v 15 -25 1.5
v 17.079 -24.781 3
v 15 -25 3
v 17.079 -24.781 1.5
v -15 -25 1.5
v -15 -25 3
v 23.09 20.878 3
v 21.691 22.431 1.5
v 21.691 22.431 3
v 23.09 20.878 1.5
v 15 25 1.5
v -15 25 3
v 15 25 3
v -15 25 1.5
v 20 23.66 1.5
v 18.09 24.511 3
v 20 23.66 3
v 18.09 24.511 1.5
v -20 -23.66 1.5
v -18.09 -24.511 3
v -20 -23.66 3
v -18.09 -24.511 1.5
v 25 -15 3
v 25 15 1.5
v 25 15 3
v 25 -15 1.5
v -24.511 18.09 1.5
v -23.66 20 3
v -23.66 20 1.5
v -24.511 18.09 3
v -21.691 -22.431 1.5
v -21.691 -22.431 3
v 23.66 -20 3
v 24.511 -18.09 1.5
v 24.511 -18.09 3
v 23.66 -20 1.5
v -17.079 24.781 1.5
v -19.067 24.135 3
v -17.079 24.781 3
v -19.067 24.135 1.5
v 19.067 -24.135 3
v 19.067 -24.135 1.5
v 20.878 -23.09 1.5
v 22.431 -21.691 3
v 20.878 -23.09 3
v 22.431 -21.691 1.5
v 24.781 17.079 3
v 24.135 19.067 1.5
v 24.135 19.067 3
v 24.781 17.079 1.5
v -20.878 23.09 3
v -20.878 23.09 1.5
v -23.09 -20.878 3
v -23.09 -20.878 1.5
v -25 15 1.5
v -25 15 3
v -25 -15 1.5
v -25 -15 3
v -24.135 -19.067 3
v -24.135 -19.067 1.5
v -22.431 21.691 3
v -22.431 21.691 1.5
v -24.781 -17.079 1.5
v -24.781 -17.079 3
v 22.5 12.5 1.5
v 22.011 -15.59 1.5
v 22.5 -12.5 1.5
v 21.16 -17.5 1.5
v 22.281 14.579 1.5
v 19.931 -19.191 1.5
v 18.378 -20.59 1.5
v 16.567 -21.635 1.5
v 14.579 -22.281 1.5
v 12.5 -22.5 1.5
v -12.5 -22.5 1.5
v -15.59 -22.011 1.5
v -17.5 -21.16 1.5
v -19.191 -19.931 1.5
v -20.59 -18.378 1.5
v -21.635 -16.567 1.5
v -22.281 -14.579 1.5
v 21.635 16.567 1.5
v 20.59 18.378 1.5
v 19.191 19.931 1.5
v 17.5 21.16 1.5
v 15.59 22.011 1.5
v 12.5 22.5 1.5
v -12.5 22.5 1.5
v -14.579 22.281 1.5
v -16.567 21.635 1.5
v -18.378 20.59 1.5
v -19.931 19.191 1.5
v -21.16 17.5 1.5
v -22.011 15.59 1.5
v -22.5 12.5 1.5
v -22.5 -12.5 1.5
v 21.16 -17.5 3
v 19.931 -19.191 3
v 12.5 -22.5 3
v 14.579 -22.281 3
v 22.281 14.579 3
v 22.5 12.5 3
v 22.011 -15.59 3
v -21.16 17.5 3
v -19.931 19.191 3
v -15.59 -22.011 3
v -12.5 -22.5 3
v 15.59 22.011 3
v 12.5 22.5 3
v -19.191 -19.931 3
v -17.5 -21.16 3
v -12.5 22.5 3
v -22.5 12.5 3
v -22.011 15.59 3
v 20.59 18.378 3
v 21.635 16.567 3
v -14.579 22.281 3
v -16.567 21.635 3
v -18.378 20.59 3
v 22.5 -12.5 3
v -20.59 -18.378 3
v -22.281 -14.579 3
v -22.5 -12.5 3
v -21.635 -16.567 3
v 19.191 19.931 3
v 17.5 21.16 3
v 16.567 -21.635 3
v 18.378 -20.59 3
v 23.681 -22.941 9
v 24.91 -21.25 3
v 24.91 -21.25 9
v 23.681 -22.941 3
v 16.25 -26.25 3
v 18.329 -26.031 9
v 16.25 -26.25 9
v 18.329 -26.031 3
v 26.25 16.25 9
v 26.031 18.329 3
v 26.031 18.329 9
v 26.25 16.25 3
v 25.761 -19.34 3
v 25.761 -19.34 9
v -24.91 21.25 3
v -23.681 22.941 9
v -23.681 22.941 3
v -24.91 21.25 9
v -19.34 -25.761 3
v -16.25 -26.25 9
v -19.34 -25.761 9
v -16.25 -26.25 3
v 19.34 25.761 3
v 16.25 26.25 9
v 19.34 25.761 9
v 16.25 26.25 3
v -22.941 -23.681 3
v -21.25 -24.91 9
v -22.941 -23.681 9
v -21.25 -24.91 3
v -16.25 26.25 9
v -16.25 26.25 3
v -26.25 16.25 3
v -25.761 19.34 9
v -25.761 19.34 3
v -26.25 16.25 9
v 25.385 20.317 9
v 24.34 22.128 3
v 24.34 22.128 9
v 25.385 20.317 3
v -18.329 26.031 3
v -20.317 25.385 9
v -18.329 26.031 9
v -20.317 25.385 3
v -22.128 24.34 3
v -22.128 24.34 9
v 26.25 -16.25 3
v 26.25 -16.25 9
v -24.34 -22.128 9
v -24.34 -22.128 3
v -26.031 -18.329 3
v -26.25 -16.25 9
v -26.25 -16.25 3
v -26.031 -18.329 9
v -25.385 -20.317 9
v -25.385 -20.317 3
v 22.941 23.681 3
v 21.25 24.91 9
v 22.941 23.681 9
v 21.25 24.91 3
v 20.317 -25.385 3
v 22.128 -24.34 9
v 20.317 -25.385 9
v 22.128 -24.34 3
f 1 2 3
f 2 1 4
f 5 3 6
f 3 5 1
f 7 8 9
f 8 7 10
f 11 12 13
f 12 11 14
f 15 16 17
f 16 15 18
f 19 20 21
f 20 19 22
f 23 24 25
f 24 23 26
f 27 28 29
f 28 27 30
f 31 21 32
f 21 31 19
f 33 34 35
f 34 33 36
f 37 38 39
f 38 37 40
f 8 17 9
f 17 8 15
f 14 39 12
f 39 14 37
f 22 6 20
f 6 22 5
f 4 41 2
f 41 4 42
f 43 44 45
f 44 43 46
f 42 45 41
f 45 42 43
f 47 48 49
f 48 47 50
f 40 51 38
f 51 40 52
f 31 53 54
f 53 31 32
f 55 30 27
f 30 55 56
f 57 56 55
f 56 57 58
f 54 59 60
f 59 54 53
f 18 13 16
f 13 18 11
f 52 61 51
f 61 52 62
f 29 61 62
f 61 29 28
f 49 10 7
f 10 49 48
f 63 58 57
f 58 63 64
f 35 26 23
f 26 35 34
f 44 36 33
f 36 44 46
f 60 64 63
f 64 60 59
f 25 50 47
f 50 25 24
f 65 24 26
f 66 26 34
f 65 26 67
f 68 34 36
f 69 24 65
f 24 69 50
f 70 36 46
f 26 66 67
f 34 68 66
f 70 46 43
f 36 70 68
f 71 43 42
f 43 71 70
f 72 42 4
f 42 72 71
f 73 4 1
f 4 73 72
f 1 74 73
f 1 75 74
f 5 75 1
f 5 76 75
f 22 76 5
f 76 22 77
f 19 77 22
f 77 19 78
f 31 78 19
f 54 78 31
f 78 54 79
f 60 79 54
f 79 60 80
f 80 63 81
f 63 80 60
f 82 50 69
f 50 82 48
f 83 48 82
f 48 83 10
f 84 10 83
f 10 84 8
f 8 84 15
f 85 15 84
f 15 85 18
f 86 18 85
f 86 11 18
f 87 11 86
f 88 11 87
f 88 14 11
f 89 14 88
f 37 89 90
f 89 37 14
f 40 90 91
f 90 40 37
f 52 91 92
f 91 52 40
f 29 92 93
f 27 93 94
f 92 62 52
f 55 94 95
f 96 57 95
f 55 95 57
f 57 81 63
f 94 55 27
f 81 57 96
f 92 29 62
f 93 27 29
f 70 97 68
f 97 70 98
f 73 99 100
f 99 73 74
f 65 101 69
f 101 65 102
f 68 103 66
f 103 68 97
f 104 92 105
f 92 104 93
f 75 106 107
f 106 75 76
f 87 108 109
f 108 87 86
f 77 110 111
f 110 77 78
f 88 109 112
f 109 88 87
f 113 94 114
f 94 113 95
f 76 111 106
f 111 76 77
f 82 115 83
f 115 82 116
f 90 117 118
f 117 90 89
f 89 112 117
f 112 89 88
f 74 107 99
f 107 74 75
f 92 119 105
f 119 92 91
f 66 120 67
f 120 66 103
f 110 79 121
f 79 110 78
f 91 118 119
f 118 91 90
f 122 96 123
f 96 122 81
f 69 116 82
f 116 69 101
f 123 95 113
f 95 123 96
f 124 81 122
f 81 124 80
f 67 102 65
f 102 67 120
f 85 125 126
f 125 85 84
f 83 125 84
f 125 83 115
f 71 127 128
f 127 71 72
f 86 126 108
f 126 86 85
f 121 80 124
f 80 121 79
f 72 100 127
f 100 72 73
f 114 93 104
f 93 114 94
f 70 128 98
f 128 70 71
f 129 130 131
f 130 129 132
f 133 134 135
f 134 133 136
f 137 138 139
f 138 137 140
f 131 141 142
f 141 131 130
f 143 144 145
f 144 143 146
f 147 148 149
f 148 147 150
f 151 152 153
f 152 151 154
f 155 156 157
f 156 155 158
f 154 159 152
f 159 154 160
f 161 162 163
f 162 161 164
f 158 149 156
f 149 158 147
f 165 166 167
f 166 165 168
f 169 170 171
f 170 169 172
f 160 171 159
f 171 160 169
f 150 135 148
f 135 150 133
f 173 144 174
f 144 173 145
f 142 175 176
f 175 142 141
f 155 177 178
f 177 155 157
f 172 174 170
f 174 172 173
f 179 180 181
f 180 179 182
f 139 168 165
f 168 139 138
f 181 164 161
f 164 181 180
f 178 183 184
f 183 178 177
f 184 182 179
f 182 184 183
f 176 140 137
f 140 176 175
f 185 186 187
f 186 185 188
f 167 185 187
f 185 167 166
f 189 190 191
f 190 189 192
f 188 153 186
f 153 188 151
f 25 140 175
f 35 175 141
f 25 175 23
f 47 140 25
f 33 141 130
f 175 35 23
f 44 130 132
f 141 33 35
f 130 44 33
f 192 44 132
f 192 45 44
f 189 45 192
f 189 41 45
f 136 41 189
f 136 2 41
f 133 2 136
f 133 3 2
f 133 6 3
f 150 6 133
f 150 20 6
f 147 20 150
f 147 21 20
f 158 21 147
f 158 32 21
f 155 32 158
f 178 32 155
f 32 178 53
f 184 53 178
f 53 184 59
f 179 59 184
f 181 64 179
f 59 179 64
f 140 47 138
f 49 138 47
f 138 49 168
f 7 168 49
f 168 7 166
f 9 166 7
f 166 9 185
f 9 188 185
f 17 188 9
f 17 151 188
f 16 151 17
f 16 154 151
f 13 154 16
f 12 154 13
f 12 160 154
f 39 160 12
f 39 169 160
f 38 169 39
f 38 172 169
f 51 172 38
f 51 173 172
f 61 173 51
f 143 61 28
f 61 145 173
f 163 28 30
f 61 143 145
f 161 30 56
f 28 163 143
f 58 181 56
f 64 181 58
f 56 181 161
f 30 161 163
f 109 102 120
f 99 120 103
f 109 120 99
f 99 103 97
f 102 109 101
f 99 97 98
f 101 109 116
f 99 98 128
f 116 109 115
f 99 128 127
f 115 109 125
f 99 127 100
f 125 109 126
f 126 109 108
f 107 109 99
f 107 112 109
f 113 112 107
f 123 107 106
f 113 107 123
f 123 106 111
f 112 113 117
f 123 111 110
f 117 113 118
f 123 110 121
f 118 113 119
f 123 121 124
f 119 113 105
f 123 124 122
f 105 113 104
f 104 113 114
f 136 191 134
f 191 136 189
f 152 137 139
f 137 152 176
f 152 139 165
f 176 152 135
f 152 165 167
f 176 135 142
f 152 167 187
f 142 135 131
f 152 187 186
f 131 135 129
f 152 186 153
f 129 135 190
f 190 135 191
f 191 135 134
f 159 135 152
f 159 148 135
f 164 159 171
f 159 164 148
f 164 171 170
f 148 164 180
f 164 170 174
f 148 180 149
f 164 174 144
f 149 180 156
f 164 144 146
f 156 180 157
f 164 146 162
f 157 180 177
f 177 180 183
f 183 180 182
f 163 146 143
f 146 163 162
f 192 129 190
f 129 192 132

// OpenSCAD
/*
 * Test for a stamp mold
 *
 * This one is not a mold, it is the stamp itself.
 */
echo(version=version());

logo = "resist.png"; // res 354 x 355
logox = 354; 
logoy = 355; 

module roundedRect(size, radius) {  
	linear_extrude(height=size.z, center=true) {
		offset(radius) offset(-radius) {
			square([size.x, size.y], center = true);
		}
	}
}

// Base plate
// ----------
plateWidth = 50;
plateLength = 50;
plateThickNess = 3;
cornerRadius = 10;

union() {
  // The plate
  translate([0, 0, 2 * plateThickNess]) {
    color("green") {
      roundedRect([plateWidth * 1.05, plateLength * 1.05, plateThickNess * 2], cornerRadius);
    }
  }
  // The "mold"
  difference() {  
    union() {
      difference() {
        //roundedRect([plateWidth, plateLength, plateThickNess], cornerRadius);
        translate([0, 0, 1]) {
          scale([.9 * plateWidth / logox, .9 * plateWidth / logoy, -.02]) {
            color("white") {
              rotate([0, 0, -90]) {
                surface(file=logo, invert=true, center=true);
              }
            }
          }
          // the groove around the picture
          /*
          difference() {
            roundedRect([plateWidth -  5, plateLength -  5, plateThickNess], cornerRadius);
            roundedRect([plateWidth - 10, plateLength - 10, plateThickNess * 1.1], cornerRadius);
          }
          */
        }
      }
      // The frame
      translate([0, 0, (plateThickNess / 1)]) {
        difference() {
          roundedRect([plateWidth, plateLength, plateThickNess], cornerRadius);
          roundedRect([plateWidth - 5, plateLength - 5, plateThickNess * 1.1], cornerRadius);
        }
      }
    }
  }
}
